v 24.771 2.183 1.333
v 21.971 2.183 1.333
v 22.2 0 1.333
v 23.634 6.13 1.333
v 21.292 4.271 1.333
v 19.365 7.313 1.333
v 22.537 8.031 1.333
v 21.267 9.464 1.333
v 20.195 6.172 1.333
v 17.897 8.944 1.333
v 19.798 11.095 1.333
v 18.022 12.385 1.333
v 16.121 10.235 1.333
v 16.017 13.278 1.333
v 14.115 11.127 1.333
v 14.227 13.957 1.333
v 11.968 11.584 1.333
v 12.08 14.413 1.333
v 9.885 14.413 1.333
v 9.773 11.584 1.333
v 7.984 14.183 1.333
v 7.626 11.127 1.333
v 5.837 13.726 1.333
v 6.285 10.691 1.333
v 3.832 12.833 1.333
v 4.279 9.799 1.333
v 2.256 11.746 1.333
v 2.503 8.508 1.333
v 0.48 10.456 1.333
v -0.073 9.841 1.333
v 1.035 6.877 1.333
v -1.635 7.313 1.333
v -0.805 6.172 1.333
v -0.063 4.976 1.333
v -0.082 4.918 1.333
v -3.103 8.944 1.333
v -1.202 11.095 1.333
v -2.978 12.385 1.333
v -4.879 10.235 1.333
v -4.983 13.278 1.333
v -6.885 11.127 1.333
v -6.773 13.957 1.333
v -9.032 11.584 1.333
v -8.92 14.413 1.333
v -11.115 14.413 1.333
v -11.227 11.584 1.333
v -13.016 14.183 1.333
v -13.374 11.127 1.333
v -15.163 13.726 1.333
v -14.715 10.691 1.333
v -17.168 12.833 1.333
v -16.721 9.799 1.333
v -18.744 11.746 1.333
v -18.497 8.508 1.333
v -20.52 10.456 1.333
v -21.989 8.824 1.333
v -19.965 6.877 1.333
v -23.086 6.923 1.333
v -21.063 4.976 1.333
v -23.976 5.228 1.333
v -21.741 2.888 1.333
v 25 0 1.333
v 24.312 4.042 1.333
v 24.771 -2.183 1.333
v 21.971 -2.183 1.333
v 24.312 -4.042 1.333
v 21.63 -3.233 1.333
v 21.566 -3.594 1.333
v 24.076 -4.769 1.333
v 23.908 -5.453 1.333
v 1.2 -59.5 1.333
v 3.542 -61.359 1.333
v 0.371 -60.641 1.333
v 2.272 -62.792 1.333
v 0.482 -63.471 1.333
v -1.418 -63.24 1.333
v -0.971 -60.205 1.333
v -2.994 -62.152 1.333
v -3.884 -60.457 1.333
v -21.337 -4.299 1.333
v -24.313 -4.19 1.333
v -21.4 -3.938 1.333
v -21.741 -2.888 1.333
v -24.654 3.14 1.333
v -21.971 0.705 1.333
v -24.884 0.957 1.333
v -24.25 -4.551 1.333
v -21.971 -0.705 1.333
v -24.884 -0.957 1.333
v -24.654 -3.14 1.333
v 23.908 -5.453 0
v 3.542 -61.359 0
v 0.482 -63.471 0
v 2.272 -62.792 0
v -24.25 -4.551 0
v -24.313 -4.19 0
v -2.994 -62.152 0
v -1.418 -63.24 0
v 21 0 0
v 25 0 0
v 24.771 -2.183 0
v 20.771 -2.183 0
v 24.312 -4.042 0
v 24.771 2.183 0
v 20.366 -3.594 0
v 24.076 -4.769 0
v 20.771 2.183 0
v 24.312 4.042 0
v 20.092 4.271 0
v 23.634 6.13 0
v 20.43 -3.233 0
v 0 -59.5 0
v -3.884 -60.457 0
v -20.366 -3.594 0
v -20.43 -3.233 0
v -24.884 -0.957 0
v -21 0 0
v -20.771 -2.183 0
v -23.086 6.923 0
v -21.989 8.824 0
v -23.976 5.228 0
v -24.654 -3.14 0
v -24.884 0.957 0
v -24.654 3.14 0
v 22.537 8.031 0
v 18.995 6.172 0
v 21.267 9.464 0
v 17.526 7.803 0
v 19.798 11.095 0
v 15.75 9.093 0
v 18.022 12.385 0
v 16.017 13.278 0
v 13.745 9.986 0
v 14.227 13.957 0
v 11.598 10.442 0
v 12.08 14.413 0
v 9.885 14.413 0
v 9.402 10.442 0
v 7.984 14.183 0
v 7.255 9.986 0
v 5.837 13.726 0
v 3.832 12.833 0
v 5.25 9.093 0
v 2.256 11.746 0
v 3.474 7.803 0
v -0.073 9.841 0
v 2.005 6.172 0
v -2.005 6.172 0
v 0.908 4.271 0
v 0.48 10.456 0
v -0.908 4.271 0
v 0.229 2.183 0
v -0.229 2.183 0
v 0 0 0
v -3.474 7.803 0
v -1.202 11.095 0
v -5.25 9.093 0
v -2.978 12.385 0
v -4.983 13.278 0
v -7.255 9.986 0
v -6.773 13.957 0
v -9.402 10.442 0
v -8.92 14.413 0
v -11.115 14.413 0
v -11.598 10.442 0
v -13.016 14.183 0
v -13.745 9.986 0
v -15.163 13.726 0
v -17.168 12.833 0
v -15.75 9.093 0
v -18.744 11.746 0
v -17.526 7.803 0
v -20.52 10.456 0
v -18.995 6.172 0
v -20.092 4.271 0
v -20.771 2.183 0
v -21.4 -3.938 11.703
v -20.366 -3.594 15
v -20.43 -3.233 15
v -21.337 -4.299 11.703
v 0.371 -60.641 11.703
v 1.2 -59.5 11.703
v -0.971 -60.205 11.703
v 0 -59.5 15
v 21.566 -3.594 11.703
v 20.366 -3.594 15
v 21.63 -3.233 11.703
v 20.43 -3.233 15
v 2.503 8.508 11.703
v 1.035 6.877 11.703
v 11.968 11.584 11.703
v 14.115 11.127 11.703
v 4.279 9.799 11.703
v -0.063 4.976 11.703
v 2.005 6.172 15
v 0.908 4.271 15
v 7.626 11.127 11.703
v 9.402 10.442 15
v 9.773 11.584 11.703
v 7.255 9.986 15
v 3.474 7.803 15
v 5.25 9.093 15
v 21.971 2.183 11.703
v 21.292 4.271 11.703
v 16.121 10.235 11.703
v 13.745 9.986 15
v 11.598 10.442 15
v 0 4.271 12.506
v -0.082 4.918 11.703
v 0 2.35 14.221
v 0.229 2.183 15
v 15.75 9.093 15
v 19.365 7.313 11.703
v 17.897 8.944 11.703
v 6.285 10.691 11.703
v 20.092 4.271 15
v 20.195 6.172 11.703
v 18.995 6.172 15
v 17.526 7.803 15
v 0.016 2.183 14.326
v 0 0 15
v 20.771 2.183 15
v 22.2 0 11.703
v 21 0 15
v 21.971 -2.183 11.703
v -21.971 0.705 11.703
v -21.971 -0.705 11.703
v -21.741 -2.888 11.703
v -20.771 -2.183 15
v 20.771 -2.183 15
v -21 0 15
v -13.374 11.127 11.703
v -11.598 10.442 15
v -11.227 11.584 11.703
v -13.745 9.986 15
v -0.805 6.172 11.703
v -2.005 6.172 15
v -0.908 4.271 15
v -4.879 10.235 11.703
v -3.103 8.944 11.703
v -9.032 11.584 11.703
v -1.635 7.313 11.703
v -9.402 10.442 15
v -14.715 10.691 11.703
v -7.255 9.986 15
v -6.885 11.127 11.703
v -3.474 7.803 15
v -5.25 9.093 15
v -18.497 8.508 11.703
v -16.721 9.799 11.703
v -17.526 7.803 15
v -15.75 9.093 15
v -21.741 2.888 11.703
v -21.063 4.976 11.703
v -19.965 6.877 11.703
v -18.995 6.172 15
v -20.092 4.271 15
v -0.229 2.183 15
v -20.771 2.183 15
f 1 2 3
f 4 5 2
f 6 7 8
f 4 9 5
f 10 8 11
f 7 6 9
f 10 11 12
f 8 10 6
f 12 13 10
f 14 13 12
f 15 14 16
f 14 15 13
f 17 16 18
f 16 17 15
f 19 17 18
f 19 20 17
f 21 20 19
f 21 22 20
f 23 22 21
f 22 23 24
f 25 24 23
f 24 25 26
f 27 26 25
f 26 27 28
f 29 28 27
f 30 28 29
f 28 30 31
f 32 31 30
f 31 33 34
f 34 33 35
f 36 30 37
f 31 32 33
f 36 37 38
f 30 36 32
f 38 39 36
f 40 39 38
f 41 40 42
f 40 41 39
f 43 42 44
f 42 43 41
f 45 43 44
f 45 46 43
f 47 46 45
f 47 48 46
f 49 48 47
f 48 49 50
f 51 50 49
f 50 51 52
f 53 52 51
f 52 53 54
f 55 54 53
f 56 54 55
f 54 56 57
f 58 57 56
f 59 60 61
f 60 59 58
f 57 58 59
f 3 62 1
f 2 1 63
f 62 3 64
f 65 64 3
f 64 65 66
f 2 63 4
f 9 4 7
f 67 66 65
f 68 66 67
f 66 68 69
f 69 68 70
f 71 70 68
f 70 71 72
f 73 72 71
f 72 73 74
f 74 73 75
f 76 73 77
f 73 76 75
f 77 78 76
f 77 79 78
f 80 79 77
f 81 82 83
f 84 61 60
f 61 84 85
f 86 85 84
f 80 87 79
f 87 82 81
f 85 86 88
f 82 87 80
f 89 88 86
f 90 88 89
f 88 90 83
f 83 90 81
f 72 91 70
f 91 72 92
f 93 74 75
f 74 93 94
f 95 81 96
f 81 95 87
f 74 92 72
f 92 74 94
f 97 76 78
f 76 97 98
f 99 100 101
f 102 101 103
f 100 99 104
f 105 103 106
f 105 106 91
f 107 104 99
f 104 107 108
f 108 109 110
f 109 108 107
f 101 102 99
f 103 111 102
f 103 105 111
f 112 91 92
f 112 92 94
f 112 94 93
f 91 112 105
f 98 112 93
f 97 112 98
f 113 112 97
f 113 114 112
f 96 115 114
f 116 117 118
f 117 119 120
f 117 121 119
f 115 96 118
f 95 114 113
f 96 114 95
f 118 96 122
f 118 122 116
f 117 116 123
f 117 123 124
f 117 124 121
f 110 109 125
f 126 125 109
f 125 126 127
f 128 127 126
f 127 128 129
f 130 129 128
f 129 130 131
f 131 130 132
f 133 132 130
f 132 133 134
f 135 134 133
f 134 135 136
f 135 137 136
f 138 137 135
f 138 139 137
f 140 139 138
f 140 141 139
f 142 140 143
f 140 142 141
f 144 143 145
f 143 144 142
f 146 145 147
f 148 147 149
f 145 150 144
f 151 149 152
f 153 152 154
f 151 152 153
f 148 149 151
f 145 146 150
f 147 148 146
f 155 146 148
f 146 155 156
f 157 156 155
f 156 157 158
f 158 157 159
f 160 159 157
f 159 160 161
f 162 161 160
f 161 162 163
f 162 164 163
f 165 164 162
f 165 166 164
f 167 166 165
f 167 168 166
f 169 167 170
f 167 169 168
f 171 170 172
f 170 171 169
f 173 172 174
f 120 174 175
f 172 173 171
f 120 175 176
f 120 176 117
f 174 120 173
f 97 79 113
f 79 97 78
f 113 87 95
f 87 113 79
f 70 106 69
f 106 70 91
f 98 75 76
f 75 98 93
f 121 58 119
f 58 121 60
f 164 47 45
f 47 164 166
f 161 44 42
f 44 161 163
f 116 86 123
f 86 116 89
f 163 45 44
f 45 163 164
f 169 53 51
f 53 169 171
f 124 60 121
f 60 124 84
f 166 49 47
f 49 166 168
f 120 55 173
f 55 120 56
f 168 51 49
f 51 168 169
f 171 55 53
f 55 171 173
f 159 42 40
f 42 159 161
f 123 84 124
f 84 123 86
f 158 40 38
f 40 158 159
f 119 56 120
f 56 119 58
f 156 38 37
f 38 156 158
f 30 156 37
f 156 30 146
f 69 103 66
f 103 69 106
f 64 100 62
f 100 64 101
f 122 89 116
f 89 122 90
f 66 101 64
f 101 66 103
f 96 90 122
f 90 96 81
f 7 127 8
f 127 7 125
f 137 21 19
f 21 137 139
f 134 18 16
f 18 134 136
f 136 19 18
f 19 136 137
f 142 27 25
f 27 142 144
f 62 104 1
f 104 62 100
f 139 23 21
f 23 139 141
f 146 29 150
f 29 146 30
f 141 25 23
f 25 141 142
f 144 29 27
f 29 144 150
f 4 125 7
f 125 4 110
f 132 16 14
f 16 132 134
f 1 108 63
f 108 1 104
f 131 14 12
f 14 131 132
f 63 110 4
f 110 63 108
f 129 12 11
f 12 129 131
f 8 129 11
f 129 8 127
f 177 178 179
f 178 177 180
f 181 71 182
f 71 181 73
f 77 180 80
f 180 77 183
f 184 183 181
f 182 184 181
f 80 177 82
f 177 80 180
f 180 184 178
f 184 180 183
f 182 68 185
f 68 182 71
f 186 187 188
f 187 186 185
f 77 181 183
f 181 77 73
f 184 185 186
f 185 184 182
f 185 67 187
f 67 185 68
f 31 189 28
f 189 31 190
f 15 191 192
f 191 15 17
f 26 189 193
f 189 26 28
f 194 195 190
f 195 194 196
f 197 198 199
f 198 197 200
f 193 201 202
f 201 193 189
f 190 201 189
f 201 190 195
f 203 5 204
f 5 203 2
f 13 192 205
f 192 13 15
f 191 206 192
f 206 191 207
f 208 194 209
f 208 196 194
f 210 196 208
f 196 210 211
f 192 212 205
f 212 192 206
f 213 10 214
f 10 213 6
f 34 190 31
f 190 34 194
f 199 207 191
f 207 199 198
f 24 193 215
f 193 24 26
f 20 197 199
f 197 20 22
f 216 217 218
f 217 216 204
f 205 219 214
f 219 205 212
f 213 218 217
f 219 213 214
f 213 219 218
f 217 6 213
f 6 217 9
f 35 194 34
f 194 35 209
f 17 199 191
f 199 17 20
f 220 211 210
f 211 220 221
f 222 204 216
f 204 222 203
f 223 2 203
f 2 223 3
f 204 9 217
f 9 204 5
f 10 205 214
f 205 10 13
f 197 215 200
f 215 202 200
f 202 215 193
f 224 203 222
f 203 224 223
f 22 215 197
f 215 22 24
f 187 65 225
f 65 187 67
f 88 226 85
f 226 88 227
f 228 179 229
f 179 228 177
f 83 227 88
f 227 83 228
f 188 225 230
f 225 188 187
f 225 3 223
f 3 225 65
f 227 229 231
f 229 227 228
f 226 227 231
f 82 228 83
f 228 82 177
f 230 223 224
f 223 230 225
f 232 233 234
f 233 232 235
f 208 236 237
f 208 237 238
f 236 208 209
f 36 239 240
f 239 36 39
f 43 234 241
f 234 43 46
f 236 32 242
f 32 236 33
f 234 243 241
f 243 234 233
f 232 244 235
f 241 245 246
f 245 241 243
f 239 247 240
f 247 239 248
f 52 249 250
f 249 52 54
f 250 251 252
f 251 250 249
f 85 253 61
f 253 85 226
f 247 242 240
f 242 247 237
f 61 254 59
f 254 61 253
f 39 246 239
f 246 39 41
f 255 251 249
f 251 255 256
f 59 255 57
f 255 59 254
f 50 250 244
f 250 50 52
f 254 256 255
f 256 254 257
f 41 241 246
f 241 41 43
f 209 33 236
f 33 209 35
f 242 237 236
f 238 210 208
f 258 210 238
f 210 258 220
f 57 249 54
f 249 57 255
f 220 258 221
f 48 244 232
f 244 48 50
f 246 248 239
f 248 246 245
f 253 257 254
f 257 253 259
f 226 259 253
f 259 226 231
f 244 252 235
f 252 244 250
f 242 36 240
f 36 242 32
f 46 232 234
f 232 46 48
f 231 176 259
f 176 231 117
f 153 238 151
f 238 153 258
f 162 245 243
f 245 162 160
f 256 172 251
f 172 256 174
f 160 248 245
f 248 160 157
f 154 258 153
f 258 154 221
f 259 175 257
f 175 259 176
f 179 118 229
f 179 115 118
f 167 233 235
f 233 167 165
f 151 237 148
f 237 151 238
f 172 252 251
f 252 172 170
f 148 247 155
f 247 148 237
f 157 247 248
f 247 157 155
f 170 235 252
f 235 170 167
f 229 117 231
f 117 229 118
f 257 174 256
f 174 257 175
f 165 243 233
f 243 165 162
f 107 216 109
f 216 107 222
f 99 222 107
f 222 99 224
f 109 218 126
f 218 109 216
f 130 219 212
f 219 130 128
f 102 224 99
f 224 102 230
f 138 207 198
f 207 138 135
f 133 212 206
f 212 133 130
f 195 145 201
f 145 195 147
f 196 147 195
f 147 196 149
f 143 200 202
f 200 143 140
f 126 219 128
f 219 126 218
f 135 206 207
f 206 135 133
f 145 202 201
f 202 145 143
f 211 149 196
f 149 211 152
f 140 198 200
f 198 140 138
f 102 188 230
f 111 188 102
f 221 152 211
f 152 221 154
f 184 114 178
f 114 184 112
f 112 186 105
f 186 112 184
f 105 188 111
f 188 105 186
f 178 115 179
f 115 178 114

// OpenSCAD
/*[Dimensions]*/

/*Width of the shape being cut*/
width = 42; //[10:300]

/*Length of the shape being cut*/
length = 70; //[10:300]

/*Height of the cutter*/
height = 15; //[5:200]

/*[Blade]*/

/*Thickness of the blade*/
wall_thickness = 1.2; //[0.3:10]

/*Cutting angle*/
cutting_angle = 20; //[10:85]

/*[Other]*/

/*Width of the base*/
base_width = 4; //[0.3:150]

/*Height of the base*/
base_height = 2; // [0.3:200]




module heart(width=60, height=60, thickness=15) {

r=width/4;
m=height-r;
alpha=atan(r/m)*2;

translate([-width/4,0,0])
	cylinder(r=r, h=thickness);
translate([width/4,0,0])
	cylinder(r=r, h=thickness);

echo("Angle of the hearth spike:");
echo(alpha);

linear_extrude(height=thickness)
	polygon(points=[
			[0, -m],
			[m*sin(alpha),-m + m*cos(alpha)],
			[width/2,0],
			[-width/2,0],
			[-m*sin(alpha),-m + m*cos(alpha)]
		]);
}


module heart_cutter(width=60, length=60, height=15, thickness=1, base_thickness=5, base_height=4, cutting_angle=30) {

	blade_height=thickness/tan(cutting_angle);

	difference() {

    	union() {

			render()
				minkowski() {
					heart(width=width, height=length, thickness=base_height/3);
					cylinder(r=base_thickness, h=base_height/3);
				}

			render() {
				minkowski() {
					heart(width=width, height=length, thickness=height-blade_height);
					cylinder(h=blade_height, r1=thickness, r2=0);
				}
			}

		}

		translate([0,0,-blade_height])
		heart(width=width, height=length, thickness=height+3*blade_height);
	
	}
}

heart_cutter(width=width, length=length, height=height, thickness=wall_thickness, base_thickness=base_width, base_height=base_height, cutting_angle=cutting_angle);
